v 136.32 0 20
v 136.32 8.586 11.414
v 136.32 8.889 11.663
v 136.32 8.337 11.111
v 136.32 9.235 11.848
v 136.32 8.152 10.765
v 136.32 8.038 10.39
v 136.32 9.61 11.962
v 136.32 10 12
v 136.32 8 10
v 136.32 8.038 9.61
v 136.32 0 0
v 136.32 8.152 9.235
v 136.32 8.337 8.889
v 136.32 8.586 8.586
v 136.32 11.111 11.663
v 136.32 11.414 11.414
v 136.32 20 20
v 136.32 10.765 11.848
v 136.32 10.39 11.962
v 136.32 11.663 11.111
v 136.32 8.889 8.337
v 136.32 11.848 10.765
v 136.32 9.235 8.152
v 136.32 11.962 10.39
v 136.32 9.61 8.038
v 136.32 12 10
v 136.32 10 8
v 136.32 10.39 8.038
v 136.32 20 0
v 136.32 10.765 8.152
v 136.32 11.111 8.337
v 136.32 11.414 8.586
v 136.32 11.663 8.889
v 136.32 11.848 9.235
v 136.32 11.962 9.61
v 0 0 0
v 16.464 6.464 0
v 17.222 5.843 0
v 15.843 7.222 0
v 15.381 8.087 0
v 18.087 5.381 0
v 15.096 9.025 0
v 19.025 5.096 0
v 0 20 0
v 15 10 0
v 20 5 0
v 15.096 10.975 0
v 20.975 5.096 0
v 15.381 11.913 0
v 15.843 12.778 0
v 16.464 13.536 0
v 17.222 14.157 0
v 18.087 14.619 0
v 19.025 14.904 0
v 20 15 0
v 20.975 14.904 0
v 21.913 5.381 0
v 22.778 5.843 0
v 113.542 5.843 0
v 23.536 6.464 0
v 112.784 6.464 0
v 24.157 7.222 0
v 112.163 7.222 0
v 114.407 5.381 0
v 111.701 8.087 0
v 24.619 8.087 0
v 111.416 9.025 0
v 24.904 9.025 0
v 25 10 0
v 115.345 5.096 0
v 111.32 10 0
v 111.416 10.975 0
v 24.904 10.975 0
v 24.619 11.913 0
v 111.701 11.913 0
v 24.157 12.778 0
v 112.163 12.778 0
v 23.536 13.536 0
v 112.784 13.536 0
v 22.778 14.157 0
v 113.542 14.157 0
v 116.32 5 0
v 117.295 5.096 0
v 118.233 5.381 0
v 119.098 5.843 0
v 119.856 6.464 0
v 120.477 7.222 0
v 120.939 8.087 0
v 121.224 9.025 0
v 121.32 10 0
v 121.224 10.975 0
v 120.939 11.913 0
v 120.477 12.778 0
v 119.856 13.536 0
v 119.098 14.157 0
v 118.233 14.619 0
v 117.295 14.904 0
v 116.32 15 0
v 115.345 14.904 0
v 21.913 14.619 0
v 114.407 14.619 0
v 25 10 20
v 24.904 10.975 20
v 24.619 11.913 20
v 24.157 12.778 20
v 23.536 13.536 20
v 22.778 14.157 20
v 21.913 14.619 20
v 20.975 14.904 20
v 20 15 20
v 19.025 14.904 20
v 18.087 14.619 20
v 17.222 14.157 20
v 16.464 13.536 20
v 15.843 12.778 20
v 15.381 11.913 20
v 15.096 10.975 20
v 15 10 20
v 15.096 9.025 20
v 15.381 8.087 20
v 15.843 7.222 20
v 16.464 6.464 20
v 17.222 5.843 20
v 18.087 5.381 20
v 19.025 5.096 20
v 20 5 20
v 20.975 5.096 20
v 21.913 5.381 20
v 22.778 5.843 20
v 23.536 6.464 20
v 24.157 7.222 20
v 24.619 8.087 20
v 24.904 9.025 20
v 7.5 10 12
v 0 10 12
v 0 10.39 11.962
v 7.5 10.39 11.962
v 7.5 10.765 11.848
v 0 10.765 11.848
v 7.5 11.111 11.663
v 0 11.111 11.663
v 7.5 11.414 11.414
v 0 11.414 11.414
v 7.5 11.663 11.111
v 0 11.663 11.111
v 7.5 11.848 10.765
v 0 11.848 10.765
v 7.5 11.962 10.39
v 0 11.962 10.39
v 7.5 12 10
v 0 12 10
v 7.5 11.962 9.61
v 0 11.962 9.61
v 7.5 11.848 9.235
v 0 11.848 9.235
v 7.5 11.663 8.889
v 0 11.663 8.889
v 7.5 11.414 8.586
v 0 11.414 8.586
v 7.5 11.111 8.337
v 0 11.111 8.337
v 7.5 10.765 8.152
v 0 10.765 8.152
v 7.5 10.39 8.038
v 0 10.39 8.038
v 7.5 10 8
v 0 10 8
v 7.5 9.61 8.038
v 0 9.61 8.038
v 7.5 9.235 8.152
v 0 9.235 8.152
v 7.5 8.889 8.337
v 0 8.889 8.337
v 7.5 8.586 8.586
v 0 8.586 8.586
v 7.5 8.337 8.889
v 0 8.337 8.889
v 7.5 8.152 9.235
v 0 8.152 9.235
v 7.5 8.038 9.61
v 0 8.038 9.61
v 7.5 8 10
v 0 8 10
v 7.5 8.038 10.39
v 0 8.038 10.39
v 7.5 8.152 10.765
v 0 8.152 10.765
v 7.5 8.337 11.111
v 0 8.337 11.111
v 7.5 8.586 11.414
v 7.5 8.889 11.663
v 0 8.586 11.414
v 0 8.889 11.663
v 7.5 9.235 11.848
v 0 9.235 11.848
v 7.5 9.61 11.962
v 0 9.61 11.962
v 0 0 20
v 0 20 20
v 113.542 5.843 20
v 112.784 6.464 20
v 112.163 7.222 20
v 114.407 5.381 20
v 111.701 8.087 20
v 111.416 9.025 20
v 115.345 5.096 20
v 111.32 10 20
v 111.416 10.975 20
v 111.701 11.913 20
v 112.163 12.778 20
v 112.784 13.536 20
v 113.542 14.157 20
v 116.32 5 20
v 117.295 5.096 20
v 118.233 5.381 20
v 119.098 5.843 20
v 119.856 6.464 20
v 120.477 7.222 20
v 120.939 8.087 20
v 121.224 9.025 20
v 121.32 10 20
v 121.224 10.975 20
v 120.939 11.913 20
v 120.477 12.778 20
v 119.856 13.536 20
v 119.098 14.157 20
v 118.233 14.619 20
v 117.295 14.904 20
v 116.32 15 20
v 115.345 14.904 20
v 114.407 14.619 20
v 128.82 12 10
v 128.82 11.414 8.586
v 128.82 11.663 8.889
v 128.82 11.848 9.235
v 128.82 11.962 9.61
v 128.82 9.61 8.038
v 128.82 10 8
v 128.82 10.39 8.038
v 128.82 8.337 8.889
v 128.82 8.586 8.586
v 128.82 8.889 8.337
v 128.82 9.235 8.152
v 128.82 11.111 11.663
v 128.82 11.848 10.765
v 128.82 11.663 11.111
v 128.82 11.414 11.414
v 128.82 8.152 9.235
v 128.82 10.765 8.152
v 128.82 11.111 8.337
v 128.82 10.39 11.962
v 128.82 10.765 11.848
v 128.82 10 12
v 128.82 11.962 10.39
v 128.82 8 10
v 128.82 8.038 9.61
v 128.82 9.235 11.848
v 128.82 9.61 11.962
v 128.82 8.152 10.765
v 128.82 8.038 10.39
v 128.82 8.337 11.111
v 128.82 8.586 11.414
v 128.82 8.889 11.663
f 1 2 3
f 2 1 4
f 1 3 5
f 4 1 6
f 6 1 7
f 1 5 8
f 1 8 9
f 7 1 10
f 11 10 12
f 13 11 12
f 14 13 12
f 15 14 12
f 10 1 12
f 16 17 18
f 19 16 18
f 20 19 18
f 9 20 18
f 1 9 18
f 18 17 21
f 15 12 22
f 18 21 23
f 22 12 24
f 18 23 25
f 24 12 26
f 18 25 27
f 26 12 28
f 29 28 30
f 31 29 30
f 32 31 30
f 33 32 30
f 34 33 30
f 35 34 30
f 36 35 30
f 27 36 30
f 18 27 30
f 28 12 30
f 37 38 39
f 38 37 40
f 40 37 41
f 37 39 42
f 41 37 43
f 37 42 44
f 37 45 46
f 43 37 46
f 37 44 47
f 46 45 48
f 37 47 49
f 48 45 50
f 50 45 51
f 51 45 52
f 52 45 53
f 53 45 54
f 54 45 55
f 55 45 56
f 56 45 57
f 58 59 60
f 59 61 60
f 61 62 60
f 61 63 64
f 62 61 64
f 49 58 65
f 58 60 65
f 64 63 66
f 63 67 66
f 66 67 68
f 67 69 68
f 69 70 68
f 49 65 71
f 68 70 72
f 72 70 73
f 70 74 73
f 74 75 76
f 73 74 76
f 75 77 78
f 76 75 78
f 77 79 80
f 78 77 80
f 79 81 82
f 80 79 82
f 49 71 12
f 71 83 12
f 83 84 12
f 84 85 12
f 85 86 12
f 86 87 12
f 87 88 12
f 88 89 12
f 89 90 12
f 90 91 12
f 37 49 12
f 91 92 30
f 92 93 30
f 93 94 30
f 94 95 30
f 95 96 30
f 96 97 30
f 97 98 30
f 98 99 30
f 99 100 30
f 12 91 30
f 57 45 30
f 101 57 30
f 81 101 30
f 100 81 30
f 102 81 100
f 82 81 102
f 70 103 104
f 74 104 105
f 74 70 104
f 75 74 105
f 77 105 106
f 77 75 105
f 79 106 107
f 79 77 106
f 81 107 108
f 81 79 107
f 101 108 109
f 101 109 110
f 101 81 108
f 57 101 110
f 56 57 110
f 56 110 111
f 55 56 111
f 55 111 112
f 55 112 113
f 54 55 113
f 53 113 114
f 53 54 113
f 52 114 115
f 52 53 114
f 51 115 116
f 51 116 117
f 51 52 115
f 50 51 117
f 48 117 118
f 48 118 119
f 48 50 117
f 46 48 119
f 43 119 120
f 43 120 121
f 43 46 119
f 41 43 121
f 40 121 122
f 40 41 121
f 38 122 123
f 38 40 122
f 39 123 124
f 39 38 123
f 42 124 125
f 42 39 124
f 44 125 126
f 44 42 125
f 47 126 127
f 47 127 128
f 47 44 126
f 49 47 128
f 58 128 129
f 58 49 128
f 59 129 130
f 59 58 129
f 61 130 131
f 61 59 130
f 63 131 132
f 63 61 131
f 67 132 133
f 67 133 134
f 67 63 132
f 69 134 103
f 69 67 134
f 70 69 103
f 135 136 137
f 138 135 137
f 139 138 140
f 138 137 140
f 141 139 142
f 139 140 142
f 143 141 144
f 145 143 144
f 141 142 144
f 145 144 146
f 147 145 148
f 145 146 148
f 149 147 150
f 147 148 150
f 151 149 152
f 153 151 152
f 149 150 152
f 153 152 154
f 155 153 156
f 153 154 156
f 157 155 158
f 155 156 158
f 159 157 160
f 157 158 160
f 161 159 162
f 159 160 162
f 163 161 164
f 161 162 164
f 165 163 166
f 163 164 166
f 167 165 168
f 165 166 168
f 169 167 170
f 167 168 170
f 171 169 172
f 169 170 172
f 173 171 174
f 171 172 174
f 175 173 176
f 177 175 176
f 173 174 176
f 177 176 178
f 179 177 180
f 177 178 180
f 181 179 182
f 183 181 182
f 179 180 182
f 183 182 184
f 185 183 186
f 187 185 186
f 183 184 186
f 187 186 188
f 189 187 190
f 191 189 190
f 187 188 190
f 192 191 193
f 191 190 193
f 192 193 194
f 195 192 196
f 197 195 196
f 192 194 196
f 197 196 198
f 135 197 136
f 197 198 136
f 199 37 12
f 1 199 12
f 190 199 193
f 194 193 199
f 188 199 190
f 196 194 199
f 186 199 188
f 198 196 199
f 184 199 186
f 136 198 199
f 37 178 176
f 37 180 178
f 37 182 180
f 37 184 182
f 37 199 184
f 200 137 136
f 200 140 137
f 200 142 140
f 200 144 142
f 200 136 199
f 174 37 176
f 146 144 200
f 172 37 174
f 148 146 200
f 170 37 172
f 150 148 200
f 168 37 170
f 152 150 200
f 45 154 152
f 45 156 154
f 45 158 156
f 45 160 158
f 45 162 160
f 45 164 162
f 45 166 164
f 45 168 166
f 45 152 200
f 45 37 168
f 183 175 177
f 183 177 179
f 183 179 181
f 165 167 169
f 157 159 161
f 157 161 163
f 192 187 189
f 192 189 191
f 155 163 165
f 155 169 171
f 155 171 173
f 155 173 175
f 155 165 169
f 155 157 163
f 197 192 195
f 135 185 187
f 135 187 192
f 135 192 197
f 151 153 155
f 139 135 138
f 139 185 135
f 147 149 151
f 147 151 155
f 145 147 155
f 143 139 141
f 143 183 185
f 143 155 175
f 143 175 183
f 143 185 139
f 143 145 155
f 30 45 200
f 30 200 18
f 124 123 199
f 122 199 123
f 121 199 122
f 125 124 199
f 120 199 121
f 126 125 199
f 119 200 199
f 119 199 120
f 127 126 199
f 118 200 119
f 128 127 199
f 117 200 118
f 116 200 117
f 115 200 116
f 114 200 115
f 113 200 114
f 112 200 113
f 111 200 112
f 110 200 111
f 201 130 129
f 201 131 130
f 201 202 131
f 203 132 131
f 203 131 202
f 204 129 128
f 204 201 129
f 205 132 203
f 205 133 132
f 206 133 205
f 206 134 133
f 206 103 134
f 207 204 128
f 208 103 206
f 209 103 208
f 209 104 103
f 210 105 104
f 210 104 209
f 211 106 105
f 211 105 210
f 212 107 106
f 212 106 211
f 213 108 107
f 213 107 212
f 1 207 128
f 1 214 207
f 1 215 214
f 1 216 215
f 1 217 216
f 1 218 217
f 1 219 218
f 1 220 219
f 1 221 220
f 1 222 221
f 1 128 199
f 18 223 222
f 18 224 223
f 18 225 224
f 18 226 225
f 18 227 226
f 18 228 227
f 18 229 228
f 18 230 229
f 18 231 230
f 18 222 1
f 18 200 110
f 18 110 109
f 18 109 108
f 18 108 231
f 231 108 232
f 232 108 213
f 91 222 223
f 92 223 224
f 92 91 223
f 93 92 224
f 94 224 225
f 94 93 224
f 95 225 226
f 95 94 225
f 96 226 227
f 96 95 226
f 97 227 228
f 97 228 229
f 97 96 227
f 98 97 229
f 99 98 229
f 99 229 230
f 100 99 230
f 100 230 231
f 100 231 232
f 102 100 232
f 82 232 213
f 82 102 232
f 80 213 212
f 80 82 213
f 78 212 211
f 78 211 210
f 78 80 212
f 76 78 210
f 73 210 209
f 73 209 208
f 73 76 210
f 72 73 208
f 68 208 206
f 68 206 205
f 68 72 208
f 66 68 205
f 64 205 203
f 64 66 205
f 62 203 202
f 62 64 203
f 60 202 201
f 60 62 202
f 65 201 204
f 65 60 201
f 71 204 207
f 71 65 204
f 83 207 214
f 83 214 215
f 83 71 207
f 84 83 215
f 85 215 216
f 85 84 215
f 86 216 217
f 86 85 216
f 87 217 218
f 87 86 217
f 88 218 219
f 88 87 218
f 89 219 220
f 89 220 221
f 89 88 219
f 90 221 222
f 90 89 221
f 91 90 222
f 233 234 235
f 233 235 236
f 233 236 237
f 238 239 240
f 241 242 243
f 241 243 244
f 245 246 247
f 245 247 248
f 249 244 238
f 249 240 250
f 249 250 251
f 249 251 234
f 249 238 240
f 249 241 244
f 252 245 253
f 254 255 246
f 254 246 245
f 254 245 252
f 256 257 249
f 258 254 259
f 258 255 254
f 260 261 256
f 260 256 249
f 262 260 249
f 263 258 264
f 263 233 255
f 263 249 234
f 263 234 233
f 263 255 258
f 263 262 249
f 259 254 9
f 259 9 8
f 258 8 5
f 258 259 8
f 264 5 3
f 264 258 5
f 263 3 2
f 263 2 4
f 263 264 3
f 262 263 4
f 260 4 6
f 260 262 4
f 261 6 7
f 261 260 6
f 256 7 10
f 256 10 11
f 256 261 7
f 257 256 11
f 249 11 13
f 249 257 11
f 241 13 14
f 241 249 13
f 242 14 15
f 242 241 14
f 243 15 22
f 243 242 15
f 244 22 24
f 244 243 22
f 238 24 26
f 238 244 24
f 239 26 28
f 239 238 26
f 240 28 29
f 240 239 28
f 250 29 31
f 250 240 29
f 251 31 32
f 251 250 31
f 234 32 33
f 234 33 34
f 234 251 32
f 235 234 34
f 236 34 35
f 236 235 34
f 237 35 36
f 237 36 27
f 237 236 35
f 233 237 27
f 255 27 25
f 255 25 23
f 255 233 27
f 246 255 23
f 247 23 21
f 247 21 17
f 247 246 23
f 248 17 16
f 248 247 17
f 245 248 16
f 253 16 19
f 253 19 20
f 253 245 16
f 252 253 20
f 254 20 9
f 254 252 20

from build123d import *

# Parameters (mm, degrees)
SKETCH1_W           = 136.32
SKETCH1_H           = 20
SKETCH1_R           = 5
BOSS_EXTRUDE1_DEPTH = 20
SKETCH2_R           = 2
CUT_EXTRUDE1_DEPTH  = 7.5
CUT_EXTRUDE2_START  = -7.5
SKETCH3_R           = 2
CUT_EXTRUDE2_DEPTH  = 7.5


with BuildPart() as part:
    # Sketch1 → Boss-Extrude1 (new body)
    with BuildSketch(Plane.XY):
        with Locations((68.16, 10)):
            Rectangle(SKETCH1_W, SKETCH1_H)
        with Locations((116.32, 10)):
            Circle(SKETCH1_R, mode=Mode.SUBTRACT)
        with Locations((20, 10)):
            Circle(SKETCH1_R, mode=Mode.SUBTRACT)
    extrude(amount=BOSS_EXTRUDE1_DEPTH)

    # Sketch2 → Cut-Extrude1 (cut)
    with BuildSketch(Plane.ZY):
        with Locations((10, 10)):
            Circle(SKETCH2_R)
    extrude(amount=-CUT_EXTRUDE1_DEPTH, mode=Mode.SUBTRACT)

    # Sketch3 → Cut-Extrude2 (cut)
    with BuildSketch(Plane(origin=(136.32, 0, 0), x_dir=(0, 0, -1), z_dir=(1, 0, 0)).offset(CUT_EXTRUDE2_START)):
        with Locations(Location((-10, 10, 0), (0, 0, 180))):
            Circle(SKETCH3_R)
    extrude(amount=CUT_EXTRUDE2_DEPTH, mode=Mode.SUBTRACT)


solid = part.part
